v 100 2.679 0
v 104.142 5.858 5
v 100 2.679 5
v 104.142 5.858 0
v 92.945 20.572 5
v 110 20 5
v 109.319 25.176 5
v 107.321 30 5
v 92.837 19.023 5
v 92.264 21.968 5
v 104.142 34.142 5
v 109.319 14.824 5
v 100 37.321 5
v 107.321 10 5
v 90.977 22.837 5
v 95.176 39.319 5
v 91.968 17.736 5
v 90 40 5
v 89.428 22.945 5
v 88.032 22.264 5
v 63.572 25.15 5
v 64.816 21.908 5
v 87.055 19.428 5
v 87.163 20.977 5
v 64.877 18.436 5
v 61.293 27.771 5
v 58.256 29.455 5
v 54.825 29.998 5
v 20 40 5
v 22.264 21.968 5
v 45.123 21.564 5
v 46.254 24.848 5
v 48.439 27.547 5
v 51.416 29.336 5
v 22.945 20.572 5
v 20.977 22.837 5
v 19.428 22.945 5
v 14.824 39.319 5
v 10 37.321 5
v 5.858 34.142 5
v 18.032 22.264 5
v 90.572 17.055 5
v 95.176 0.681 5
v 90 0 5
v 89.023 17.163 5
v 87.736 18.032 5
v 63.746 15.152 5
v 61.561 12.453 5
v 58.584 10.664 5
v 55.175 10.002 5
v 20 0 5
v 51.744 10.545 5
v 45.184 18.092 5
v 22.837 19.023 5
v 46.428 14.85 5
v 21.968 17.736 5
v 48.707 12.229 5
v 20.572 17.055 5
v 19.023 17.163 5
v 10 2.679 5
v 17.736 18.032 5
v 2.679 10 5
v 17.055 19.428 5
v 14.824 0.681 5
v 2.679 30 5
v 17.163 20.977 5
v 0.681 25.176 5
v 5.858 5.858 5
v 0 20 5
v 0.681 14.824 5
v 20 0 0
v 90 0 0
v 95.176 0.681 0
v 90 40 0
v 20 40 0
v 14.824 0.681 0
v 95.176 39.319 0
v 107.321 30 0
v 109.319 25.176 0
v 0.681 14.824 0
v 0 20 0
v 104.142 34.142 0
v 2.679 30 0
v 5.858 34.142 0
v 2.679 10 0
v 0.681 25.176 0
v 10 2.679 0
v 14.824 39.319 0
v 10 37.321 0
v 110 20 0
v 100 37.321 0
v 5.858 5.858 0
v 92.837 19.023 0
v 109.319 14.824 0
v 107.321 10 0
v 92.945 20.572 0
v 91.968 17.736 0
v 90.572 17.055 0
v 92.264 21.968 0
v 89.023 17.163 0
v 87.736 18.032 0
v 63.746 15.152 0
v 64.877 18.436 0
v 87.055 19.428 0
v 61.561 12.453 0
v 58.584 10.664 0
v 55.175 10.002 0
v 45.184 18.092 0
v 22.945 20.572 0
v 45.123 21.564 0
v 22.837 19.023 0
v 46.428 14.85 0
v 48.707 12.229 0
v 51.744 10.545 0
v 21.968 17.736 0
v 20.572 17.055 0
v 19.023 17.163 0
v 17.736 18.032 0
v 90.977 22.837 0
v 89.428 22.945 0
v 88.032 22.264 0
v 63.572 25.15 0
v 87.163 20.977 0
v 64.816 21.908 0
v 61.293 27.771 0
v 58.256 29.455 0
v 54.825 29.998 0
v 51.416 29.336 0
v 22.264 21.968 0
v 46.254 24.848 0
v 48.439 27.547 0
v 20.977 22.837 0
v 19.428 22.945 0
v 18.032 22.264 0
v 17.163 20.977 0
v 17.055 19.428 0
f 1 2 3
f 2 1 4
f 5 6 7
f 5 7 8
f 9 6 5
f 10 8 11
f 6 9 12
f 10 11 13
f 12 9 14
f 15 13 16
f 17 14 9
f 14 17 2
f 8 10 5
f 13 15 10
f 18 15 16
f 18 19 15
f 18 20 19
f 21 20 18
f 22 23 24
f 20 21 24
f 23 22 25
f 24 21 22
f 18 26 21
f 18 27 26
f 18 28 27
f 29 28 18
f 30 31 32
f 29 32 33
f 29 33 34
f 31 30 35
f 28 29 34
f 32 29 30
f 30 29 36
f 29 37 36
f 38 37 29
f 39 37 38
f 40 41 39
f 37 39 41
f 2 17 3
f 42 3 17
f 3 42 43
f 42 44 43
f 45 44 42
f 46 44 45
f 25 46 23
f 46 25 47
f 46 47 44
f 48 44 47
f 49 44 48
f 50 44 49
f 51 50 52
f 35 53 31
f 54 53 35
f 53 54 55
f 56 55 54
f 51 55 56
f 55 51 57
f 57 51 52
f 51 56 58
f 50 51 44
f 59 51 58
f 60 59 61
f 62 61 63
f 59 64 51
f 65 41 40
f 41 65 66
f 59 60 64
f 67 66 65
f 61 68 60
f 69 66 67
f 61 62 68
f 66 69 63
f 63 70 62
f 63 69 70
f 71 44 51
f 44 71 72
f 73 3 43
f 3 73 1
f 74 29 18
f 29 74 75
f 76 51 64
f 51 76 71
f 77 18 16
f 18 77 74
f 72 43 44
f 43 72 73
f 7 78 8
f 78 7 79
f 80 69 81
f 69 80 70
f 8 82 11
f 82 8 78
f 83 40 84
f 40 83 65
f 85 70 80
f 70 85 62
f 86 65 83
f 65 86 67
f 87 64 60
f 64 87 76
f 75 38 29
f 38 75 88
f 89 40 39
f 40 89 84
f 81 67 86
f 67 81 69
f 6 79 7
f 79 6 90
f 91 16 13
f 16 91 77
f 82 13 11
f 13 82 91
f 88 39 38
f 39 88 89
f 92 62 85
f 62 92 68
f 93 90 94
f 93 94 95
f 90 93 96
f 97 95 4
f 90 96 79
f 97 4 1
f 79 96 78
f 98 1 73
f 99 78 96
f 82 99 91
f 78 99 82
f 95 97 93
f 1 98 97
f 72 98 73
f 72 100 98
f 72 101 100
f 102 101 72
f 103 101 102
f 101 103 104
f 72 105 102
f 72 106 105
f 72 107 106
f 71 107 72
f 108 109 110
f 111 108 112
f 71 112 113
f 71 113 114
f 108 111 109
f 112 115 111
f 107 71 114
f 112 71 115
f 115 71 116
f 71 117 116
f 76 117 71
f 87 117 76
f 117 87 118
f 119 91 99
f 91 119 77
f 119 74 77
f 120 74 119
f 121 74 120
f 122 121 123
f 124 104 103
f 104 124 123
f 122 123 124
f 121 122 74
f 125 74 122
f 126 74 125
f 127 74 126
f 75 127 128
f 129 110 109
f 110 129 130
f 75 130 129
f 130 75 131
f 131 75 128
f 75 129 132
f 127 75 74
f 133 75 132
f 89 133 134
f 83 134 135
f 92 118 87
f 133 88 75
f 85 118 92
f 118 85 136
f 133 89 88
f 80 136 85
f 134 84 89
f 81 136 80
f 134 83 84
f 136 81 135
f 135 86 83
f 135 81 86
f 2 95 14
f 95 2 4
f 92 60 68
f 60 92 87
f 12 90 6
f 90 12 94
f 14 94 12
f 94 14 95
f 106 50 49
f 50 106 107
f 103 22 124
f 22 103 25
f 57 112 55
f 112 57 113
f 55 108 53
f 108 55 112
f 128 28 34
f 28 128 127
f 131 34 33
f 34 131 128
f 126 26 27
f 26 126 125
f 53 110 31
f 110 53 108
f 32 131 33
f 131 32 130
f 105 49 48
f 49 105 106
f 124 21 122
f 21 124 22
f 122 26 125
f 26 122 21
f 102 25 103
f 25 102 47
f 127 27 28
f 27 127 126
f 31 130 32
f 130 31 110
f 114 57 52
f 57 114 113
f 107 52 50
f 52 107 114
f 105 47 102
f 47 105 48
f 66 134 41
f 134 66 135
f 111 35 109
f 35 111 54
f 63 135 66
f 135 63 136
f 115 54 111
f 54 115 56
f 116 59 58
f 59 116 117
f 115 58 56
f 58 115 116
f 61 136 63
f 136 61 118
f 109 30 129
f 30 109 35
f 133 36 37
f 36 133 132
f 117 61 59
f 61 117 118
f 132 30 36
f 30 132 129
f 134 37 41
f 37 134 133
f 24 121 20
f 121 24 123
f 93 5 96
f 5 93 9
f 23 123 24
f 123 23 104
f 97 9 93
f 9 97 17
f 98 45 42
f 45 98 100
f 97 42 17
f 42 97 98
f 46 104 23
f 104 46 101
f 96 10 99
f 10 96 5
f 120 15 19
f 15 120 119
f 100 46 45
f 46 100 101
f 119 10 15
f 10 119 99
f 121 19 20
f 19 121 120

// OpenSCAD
$fn = 32;

// ----------------------------------------------------------------------
// Spacer plate: obround span 70, caps R20
// ----------------------------------------------------------------------

// --- parameters (mm) ---
bore_r = 10;              // centre bore radius
bolt_r = 3;               // bolt hole radius
plate_t = 5;              // plate thickness, Z (extrusion height)
span = 70;                // obround span
cap_r = 20;               // cap radius

profile = [[20, 40], [14.824, 39.319], [10, 37.321], [5.858, 34.142], [2.679, 30], [0.681, 25.176], [0, 20], [0.681, 14.824], [2.679, 10], [5.858, 5.858], [10, 2.679], [14.824, 0.681], [20, 0], [90, 0], [95.176, 0.681], [100, 2.679], [104.142, 5.858], [107.321, 10], [109.319, 14.824], [110, 20], [109.319, 25.176], [107.321, 30], [104.142, 34.142], [100, 37.321], [95.176, 39.319], [90, 40]];  // primary outline, 26 points, counter clockwise
void_1 = [[64.816, 21.908], [63.572, 25.15], [61.293, 27.771], [58.256, 29.455], [54.825, 29.998], [51.416, 29.336], [48.439, 27.547], [46.254, 24.848], [45.123, 21.564], [45.184, 18.092], [46.428, 14.85], [48.707, 12.229], [51.744, 10.545], [55.175, 10.002], [58.584, 10.664], [61.561, 12.453], [63.746, 15.152], [64.877, 18.436]];  // centre bore, 18 points
void_2 = [[22.945, 20.572], [22.264, 21.968], [20.977, 22.837], [19.428, 22.945], [18.032, 22.264], [17.163, 20.977], [17.055, 19.428], [17.736, 18.032], [19.023, 17.163], [20.572, 17.055], [21.968, 17.736], [22.837, 19.023]];  // end hole, 12 points
void_3 = [[92.945, 20.572], [92.264, 21.968], [90.977, 22.837], [89.428, 22.945], [88.032, 22.264], [87.163, 20.977], [87.055, 19.428], [87.736, 18.032], [89.023, 17.163], [90.572, 17.055], [91.968, 17.736], [92.837, 19.023]];  // end hole, 12 points

// --- the one profile operation ---
difference() {
  linear_extrude(height = plate_t) polygon(points = profile);
  translate([0, 0, -1])
    linear_extrude(height = plate_t + 2) polygon(points = void_1);
  translate([0, 0, -1])
    linear_extrude(height = plate_t + 2) polygon(points = void_2);
  translate([0, 0, -1])
    linear_extrude(height = plate_t + 2) polygon(points = void_3);
}
